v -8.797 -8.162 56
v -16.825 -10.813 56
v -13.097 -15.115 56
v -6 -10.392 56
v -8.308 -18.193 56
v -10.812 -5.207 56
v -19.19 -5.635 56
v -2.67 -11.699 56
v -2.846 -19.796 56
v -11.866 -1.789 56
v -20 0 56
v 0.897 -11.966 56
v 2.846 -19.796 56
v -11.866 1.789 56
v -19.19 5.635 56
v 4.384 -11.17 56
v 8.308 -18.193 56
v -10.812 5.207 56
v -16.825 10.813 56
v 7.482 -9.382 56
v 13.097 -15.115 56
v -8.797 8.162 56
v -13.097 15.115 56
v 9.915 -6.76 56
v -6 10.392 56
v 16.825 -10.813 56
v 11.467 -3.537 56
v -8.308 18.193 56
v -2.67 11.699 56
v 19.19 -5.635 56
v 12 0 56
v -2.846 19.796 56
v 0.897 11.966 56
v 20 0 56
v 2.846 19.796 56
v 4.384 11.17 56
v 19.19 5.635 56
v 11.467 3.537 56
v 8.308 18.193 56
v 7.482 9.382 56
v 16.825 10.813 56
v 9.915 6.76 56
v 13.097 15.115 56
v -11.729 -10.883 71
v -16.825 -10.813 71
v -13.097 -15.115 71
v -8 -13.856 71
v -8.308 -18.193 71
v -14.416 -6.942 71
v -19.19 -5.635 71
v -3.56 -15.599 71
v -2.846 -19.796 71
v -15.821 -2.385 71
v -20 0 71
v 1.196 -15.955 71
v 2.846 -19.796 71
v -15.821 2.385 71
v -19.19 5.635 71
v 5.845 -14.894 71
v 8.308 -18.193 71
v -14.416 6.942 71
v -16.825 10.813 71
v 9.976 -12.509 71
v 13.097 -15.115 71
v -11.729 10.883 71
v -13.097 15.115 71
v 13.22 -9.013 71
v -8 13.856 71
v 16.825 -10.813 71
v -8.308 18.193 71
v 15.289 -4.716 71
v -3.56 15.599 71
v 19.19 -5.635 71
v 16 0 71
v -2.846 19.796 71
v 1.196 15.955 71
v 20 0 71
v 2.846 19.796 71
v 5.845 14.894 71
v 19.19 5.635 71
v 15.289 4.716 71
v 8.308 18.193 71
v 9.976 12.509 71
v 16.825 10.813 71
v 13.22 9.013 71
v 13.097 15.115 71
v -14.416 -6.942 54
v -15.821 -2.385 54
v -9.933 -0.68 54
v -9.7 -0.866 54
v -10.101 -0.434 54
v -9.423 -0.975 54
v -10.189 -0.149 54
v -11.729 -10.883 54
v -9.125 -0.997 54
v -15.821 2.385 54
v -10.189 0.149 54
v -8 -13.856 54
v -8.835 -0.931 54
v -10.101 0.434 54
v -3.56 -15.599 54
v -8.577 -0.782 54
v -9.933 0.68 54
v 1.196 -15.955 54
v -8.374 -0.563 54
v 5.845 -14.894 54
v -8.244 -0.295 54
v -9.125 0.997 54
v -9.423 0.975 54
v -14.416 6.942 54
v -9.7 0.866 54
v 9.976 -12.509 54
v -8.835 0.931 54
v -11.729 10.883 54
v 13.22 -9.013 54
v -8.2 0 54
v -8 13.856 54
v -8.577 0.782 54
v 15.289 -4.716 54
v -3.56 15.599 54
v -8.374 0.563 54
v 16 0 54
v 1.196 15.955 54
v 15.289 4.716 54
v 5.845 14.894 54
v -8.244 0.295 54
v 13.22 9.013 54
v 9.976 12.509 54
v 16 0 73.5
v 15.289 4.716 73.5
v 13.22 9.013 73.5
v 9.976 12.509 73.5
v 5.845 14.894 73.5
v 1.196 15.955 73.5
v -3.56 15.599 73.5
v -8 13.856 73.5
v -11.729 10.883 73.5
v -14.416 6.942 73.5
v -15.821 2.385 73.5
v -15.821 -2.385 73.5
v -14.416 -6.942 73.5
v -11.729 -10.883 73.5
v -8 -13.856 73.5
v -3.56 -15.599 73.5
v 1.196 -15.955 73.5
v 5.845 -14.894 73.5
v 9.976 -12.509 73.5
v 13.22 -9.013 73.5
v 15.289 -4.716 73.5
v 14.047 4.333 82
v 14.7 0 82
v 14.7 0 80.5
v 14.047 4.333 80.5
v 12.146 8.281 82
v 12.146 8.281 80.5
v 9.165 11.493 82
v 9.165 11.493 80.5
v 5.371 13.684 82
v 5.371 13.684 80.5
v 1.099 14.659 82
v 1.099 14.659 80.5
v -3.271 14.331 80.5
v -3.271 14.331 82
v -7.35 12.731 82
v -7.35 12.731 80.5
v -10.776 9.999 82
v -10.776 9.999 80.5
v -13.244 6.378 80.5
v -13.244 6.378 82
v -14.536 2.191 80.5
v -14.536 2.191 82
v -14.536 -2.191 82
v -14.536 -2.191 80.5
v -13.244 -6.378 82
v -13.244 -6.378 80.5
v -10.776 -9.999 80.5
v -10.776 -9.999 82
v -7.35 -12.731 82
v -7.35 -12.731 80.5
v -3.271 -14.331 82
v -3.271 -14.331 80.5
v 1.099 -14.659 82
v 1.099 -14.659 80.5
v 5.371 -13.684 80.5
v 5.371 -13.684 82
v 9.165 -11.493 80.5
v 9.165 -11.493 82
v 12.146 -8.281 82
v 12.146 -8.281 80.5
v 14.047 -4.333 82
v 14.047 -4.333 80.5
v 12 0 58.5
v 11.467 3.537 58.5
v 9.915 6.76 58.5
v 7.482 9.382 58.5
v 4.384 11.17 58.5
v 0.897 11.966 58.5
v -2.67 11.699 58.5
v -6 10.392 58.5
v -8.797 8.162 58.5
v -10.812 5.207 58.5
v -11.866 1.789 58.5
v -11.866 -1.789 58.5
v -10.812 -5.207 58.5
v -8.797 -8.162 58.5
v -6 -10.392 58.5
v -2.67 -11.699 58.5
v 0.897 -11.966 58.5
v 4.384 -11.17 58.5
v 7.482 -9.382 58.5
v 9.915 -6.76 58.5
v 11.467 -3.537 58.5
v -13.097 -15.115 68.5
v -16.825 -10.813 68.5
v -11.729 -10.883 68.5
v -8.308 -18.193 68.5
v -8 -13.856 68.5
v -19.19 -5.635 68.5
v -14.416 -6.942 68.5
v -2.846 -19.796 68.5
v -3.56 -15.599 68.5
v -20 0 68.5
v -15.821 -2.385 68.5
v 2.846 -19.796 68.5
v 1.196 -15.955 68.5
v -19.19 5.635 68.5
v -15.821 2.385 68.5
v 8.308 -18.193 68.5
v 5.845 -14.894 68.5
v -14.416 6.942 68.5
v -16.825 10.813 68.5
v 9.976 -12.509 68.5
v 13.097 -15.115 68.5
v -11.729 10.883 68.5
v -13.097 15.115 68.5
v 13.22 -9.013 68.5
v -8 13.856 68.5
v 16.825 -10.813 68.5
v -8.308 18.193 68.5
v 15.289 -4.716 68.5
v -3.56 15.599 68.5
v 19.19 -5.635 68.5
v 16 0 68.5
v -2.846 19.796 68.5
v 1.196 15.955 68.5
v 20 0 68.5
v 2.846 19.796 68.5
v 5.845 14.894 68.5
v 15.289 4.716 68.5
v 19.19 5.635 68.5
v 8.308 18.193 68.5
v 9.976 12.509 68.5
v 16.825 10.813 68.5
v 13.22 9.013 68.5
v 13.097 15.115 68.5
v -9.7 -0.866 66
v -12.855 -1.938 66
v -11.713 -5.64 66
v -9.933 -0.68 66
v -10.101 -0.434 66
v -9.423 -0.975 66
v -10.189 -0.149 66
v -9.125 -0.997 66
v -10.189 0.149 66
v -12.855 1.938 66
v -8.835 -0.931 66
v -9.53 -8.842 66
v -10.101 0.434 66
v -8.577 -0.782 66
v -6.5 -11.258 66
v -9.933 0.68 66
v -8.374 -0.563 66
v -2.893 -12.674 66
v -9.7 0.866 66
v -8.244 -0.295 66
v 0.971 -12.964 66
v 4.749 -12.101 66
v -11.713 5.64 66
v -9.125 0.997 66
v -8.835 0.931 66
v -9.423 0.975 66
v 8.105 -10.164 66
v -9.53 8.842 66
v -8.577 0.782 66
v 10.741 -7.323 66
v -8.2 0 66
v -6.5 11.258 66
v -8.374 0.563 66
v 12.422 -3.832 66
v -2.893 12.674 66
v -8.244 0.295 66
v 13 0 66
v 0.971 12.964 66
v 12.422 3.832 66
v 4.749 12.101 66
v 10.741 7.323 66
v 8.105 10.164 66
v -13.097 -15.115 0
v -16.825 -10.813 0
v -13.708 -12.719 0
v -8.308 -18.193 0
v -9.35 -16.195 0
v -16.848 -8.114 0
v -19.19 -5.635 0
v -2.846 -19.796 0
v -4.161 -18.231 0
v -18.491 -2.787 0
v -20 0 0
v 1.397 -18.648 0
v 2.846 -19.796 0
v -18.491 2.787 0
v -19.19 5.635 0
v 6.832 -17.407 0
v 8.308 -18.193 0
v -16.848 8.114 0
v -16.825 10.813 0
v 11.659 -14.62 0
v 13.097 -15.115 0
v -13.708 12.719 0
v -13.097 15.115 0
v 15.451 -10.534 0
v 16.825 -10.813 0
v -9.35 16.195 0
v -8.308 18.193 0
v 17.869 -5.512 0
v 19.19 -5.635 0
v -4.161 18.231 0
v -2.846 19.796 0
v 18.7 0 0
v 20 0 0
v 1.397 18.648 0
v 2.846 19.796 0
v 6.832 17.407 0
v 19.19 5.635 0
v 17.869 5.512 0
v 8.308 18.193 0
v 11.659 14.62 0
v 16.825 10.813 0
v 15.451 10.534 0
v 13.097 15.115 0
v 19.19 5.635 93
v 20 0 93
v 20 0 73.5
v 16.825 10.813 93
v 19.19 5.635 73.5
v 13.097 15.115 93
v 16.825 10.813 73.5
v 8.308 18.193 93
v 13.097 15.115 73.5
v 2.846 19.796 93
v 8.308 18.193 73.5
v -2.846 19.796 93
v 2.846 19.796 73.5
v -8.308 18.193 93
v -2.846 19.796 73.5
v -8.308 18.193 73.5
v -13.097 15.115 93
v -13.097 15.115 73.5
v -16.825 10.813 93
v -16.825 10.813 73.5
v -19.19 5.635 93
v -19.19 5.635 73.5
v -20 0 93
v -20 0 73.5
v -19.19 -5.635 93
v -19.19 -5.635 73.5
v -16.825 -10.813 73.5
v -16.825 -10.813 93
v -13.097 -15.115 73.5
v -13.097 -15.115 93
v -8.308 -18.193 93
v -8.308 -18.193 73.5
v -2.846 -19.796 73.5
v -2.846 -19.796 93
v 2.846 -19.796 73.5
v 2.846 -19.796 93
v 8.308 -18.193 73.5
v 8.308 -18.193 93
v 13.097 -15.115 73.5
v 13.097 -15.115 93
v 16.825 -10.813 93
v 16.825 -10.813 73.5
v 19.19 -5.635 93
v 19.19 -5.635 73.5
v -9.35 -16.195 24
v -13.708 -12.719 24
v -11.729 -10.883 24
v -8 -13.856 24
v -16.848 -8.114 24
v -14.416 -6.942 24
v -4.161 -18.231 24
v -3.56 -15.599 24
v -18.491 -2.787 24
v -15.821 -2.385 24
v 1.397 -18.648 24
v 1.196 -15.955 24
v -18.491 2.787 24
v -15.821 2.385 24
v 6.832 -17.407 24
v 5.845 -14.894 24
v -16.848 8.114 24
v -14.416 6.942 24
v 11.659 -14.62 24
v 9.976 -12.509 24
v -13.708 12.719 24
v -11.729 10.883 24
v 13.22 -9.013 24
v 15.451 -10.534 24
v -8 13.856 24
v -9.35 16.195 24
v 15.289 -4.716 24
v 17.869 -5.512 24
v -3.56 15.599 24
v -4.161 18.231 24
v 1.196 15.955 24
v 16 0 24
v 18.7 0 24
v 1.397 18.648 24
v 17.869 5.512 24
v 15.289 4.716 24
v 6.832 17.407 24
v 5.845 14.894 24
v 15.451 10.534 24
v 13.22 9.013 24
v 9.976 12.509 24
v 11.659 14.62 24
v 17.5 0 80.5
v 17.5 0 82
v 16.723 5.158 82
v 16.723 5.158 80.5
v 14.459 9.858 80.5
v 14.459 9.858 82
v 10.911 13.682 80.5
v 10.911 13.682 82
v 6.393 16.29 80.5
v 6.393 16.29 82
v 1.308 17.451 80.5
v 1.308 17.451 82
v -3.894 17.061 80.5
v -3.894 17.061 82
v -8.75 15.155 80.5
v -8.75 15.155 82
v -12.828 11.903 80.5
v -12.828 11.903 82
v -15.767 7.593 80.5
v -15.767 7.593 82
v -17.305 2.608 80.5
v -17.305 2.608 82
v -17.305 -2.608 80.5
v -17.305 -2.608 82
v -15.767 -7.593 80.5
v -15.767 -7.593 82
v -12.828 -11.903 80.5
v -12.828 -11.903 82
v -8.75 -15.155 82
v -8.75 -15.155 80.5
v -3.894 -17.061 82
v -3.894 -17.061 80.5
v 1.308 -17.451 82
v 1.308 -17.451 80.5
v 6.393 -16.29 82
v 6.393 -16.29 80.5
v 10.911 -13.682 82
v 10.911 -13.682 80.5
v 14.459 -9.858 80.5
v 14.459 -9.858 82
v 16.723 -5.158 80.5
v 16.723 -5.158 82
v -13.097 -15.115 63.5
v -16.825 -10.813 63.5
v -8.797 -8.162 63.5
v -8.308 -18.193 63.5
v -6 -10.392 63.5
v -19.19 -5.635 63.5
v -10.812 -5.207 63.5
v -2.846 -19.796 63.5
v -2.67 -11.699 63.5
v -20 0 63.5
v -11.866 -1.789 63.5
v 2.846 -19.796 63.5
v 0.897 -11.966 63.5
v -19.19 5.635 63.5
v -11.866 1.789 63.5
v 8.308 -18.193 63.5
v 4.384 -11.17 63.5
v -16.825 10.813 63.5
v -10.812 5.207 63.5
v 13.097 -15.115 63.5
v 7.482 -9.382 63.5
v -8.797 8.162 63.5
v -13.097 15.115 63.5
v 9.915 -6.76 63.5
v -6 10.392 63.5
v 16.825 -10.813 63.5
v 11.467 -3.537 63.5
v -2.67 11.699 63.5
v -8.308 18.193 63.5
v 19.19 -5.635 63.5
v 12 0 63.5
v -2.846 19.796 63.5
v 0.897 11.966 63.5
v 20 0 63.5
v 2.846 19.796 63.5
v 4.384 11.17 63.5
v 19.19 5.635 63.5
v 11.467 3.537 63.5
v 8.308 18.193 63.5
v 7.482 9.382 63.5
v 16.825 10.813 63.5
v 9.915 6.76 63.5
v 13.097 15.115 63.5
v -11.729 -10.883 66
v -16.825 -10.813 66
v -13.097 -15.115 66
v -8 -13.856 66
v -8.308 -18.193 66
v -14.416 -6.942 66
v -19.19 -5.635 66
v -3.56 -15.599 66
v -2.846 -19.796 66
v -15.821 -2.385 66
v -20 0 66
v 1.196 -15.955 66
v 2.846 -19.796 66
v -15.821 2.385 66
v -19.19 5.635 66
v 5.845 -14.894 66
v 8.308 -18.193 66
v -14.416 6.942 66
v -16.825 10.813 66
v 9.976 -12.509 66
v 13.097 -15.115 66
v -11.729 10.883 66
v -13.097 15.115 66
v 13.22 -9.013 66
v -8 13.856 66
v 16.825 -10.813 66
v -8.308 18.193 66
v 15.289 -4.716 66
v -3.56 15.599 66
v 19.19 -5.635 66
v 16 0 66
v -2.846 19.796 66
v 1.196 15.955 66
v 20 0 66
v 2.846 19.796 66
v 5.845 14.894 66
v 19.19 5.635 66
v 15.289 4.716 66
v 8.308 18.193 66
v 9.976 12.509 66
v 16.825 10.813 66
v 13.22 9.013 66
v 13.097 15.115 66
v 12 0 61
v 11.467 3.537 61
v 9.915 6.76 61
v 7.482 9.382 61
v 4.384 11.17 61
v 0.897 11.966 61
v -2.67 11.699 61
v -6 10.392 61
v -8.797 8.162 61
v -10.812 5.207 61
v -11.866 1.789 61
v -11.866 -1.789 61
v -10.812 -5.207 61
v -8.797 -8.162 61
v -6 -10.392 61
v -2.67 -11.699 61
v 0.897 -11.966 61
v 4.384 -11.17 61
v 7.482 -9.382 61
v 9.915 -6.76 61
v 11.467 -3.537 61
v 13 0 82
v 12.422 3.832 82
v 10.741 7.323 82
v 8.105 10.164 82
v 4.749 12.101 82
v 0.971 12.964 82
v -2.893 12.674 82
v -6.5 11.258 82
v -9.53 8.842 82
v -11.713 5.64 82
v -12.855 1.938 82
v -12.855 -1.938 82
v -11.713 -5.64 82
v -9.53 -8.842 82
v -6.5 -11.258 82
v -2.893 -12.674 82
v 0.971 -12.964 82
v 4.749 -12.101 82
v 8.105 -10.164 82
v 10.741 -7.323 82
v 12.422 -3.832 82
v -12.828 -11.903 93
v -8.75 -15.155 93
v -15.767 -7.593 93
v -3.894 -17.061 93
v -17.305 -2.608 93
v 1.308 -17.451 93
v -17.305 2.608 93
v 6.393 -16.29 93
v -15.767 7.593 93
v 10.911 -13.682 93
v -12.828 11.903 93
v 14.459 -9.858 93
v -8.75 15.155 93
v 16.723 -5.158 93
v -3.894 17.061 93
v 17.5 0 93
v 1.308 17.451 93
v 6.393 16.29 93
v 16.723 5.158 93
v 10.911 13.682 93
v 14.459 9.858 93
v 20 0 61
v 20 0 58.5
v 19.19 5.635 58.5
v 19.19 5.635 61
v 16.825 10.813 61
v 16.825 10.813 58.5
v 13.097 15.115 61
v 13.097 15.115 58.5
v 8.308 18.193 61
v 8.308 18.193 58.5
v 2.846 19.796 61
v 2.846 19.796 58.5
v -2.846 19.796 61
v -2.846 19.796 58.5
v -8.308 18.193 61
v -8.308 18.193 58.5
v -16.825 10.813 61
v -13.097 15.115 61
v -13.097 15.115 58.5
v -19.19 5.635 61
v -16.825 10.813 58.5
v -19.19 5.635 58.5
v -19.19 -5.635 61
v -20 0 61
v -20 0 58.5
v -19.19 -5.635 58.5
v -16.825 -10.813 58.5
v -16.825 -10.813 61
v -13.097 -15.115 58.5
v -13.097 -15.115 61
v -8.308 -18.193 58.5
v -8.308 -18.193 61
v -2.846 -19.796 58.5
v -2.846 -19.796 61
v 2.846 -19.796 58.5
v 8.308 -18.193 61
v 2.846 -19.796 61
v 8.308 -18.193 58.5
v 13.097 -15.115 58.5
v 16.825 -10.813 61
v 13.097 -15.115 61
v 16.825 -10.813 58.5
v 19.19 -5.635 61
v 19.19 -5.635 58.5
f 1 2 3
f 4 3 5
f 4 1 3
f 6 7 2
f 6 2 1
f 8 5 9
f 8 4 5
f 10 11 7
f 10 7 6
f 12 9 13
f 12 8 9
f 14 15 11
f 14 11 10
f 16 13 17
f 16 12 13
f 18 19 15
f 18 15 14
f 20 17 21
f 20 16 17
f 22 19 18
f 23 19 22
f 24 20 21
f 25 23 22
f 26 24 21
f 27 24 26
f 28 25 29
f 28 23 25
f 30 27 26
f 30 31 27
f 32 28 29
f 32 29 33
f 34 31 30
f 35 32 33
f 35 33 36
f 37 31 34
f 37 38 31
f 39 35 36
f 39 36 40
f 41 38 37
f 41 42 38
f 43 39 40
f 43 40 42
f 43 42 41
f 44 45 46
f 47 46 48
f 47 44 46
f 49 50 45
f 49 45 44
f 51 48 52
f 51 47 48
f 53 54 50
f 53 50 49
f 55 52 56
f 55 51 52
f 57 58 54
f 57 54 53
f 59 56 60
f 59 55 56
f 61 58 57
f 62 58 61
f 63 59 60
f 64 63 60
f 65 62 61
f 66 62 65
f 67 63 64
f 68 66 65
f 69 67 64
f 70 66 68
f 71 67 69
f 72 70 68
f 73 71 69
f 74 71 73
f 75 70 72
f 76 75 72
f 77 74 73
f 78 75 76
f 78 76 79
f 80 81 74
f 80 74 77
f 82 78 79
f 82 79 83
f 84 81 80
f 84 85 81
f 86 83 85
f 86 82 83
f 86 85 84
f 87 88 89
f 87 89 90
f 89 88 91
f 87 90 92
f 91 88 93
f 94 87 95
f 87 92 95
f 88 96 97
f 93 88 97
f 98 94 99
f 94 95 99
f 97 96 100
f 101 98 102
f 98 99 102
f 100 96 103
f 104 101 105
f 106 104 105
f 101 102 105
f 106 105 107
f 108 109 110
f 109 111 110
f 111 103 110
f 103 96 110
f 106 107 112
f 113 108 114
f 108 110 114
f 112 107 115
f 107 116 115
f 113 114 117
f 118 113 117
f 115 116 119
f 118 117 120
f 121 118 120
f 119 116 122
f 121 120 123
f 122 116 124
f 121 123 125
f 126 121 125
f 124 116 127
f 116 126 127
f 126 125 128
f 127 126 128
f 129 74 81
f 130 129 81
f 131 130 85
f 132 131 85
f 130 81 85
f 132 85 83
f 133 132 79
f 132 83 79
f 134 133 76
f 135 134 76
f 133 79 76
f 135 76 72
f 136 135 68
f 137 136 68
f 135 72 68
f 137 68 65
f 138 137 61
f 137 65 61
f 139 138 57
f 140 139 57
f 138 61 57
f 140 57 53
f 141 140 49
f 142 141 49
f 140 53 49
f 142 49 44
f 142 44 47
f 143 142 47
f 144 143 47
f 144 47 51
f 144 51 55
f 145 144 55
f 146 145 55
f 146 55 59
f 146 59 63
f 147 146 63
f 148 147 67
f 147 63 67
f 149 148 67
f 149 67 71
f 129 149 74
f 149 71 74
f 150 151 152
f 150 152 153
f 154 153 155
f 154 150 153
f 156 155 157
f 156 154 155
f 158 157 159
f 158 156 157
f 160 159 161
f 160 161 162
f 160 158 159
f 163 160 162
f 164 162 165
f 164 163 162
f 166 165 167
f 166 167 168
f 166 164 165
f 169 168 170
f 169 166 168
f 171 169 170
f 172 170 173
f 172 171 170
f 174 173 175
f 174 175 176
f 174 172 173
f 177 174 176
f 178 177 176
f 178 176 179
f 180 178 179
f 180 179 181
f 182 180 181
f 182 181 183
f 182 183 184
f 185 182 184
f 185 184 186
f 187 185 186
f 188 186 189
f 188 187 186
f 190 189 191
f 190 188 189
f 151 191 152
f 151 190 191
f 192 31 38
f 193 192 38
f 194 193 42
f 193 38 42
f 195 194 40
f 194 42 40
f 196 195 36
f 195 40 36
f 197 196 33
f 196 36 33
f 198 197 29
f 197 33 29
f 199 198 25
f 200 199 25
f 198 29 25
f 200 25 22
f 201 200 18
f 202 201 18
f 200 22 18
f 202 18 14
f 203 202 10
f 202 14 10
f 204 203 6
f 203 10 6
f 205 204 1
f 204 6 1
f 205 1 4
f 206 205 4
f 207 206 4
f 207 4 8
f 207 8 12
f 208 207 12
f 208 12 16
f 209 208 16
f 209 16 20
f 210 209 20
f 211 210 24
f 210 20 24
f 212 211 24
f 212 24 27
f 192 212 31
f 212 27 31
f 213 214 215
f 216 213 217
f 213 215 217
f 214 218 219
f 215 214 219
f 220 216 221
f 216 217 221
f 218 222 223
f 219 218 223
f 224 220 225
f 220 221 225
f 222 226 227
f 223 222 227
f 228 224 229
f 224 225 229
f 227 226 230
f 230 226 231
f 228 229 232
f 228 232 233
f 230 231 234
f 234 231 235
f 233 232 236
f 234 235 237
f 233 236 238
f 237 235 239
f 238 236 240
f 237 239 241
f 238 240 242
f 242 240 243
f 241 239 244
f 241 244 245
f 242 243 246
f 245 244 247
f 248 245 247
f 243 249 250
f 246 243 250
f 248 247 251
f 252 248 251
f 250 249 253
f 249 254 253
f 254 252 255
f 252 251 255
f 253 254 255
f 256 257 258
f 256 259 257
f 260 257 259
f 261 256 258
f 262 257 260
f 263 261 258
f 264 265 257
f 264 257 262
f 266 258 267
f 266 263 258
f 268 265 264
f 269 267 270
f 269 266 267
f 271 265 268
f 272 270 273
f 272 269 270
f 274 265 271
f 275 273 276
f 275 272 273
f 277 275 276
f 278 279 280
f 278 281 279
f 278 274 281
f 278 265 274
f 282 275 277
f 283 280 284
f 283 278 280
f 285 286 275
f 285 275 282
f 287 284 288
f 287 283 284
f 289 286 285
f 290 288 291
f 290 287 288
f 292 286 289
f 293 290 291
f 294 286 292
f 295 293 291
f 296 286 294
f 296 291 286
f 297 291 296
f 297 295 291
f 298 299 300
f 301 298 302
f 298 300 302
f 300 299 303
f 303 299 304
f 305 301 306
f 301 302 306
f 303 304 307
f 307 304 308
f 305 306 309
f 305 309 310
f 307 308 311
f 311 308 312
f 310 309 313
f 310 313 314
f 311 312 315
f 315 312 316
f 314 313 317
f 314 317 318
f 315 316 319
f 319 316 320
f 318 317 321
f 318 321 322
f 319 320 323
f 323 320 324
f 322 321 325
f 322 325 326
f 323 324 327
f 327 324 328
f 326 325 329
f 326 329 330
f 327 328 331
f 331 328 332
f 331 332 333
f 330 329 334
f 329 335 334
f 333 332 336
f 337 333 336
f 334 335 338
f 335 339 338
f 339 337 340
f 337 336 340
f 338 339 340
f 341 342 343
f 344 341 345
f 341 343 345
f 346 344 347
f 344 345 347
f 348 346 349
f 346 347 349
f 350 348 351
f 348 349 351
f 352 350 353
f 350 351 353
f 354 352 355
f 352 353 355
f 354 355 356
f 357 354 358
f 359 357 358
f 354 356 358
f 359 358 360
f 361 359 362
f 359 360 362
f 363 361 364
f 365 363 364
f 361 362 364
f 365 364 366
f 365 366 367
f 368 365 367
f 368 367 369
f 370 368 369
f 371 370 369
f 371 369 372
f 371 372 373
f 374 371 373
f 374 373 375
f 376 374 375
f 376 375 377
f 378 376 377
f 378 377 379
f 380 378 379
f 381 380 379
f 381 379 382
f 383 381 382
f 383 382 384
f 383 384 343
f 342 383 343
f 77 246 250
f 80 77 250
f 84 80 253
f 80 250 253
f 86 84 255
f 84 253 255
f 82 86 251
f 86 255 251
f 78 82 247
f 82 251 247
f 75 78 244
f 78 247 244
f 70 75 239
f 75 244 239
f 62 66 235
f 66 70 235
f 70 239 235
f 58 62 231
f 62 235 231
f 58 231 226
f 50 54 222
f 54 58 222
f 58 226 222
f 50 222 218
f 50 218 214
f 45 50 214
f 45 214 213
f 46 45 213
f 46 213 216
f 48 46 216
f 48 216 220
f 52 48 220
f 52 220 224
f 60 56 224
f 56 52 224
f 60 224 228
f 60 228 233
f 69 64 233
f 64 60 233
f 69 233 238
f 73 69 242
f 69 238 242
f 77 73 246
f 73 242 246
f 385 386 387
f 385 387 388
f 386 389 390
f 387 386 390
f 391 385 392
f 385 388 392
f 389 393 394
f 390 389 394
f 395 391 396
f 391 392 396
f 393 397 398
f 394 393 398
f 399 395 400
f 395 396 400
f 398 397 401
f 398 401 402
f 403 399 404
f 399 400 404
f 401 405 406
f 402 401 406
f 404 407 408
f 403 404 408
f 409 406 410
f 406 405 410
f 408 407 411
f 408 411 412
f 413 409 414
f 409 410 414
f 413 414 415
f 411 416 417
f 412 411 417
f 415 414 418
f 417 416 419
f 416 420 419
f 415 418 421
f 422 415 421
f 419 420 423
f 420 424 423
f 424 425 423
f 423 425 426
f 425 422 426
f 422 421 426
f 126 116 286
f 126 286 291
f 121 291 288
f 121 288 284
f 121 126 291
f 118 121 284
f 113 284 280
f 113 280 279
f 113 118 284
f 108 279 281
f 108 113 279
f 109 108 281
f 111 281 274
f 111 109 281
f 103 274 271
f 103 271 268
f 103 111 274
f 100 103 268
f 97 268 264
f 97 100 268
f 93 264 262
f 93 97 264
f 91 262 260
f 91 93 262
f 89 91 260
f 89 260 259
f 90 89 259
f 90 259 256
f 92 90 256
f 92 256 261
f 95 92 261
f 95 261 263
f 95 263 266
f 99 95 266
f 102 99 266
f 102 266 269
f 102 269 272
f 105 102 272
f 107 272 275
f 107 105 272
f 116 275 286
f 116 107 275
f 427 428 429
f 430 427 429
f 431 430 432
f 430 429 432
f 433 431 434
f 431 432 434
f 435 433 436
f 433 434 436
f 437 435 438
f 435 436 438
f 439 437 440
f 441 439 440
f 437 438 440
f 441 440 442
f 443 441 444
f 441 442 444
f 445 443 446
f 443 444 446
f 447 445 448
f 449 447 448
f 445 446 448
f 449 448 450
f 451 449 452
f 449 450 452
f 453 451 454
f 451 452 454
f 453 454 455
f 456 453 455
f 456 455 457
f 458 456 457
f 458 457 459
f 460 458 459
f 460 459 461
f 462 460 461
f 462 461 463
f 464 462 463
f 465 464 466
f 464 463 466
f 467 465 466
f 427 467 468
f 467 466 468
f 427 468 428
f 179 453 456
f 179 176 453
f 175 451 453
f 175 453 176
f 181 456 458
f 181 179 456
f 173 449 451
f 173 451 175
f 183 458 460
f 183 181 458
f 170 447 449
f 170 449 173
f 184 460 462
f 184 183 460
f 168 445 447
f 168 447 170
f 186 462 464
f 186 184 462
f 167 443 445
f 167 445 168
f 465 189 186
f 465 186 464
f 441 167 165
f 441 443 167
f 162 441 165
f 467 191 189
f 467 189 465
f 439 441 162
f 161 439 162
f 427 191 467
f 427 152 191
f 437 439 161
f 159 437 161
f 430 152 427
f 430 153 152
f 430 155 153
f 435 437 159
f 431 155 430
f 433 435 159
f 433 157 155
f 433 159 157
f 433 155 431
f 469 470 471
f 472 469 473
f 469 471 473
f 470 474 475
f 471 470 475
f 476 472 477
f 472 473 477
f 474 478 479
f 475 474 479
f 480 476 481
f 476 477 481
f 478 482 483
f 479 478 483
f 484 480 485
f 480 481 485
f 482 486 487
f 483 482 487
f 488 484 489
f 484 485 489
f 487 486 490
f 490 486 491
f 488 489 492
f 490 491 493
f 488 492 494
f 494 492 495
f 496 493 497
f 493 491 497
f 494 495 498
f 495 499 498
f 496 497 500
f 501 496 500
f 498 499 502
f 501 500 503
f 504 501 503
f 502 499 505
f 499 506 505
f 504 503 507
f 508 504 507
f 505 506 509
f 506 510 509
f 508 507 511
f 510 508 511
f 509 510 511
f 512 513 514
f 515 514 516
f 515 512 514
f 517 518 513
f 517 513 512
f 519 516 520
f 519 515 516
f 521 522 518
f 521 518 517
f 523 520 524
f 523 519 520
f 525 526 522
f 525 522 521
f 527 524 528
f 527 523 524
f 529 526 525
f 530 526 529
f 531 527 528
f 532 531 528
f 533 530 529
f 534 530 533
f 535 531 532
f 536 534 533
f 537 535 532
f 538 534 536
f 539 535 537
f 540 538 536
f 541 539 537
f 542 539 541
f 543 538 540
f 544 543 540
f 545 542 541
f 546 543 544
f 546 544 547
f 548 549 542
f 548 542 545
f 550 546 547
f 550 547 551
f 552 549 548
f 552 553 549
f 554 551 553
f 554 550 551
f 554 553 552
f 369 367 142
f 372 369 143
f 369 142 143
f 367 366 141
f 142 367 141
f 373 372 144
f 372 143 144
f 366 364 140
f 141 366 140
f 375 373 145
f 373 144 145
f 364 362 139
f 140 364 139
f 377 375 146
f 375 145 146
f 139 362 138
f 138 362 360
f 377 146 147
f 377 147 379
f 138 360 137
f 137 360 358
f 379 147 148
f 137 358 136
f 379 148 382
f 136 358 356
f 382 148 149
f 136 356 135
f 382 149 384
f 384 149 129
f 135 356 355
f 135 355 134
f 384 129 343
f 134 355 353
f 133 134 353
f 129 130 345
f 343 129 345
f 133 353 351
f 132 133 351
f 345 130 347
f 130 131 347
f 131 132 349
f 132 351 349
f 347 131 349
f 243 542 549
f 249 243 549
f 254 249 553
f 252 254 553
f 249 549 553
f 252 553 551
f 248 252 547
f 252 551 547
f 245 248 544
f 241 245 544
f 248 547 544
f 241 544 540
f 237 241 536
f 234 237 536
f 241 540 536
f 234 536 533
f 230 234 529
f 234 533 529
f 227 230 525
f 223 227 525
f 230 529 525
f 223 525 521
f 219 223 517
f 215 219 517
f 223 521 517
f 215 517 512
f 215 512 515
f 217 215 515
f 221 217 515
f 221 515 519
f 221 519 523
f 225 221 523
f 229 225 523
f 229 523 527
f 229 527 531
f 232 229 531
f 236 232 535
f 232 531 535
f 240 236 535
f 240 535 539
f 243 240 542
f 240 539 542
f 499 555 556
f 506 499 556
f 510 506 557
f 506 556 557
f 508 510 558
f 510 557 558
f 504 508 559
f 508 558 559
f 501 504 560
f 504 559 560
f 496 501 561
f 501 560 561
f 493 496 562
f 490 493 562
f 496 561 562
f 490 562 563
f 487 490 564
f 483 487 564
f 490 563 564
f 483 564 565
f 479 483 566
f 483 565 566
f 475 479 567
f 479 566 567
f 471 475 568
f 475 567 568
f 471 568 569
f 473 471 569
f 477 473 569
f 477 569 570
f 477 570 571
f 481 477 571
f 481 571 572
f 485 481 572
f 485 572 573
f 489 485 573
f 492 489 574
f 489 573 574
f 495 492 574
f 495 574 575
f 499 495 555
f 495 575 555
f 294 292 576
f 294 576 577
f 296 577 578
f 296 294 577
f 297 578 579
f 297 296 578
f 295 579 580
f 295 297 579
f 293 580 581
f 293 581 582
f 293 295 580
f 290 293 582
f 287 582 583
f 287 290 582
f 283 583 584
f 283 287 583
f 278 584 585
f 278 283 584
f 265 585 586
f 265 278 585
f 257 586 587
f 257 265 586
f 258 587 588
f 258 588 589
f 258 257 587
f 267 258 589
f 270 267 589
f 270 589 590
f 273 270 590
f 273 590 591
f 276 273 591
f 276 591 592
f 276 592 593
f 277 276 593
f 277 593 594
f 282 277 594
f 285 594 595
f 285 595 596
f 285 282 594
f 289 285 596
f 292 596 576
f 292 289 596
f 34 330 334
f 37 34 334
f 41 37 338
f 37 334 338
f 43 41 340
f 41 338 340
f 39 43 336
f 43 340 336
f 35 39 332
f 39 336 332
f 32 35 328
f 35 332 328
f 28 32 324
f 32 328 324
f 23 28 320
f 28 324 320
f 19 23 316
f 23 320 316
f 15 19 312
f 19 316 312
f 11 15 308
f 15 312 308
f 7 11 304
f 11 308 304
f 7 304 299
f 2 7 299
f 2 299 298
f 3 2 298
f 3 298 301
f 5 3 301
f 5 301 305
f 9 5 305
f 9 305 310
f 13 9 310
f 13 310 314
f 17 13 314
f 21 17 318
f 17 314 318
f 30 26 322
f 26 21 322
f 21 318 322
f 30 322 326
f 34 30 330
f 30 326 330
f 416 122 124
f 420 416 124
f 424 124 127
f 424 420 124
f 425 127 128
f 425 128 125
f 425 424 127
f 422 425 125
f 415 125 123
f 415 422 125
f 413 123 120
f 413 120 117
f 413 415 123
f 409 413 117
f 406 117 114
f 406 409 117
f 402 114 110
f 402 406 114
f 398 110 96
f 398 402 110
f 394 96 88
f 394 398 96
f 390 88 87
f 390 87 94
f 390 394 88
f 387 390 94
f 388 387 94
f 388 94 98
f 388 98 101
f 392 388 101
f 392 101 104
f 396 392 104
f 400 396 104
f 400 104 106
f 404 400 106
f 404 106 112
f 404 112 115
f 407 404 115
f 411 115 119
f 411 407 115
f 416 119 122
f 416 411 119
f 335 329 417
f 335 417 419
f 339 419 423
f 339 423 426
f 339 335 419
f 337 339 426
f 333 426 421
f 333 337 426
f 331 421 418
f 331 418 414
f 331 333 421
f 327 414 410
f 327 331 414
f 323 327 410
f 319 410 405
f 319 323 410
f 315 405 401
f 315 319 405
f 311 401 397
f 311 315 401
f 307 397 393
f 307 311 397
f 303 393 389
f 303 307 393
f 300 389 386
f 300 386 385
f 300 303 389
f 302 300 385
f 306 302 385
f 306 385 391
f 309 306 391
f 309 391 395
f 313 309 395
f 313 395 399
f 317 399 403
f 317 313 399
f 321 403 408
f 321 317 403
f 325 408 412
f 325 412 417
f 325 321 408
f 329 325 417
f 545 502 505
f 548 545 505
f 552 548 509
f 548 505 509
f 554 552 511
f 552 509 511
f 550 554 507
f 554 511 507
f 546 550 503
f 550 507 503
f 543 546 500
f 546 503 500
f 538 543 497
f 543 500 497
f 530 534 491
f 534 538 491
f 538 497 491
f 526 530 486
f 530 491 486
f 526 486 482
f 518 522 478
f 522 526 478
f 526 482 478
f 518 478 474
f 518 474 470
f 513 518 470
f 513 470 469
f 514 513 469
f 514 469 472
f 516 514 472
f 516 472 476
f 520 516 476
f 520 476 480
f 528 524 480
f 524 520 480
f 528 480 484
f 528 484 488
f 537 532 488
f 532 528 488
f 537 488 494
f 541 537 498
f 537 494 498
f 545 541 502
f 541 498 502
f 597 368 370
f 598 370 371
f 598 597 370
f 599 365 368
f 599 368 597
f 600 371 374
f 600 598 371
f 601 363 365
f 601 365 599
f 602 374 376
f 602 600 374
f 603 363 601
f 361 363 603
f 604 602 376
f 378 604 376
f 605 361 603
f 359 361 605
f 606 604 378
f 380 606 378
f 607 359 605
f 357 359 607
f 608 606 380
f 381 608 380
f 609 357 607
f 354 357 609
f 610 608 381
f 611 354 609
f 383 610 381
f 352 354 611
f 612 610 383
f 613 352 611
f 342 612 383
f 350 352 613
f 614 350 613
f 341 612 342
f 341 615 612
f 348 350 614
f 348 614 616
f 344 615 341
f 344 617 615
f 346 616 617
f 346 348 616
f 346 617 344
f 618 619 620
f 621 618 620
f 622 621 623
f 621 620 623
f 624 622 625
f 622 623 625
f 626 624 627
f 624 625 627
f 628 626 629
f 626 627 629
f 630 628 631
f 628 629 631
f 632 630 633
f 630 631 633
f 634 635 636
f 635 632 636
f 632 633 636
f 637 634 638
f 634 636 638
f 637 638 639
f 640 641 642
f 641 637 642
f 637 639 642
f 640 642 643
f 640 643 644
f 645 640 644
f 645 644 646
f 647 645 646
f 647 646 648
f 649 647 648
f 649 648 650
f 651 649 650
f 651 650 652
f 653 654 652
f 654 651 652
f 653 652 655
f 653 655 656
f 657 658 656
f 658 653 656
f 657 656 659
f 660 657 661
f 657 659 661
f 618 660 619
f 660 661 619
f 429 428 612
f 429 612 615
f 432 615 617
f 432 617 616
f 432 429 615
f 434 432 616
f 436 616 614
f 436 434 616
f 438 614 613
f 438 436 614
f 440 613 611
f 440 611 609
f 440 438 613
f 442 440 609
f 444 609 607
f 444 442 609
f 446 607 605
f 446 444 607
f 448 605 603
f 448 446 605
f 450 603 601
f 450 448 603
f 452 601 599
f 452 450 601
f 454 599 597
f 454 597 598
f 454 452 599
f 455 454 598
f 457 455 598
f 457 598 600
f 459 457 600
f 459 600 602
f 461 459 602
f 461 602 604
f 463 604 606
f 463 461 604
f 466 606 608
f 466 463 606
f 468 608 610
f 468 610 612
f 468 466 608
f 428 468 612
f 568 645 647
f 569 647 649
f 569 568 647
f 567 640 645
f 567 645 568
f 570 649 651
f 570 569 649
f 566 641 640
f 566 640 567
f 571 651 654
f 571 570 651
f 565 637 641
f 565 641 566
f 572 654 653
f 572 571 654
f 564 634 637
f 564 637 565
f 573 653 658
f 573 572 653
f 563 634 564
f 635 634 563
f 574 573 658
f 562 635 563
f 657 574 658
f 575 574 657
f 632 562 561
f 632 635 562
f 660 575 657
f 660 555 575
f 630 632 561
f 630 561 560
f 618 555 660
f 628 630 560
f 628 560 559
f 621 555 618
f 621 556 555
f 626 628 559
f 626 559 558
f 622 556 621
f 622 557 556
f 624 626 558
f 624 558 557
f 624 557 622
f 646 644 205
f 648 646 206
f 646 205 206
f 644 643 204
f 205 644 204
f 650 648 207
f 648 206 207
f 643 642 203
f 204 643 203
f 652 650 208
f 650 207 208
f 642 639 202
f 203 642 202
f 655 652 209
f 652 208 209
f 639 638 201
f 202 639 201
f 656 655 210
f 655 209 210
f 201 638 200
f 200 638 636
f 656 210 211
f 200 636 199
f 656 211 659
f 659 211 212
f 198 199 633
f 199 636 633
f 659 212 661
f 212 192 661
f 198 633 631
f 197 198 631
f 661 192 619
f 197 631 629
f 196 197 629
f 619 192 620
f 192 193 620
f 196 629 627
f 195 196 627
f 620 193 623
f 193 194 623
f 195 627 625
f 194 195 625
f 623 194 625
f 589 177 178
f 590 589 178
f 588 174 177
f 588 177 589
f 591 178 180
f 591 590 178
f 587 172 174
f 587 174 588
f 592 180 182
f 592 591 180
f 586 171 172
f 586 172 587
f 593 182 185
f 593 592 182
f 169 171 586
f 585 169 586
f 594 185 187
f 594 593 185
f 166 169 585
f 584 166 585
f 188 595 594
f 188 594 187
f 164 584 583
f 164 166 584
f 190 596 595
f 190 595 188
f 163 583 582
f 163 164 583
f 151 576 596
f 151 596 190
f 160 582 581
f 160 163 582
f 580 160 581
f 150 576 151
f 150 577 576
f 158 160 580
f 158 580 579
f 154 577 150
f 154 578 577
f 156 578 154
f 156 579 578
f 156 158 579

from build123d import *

# Parameters (mm, degrees)
SKETCH_R       = 18.7
PAD_DEPTH      = 24
SKETCH001_R    = 16
PAD001_DEPTH   = 30
SKETCH002_R    = 1
PAD002_DEPTH   = 12
SKETCH003_R    = 13
PAD003_DEPTH   = 16
SKETCH004_R    = 17.5
PAD004_DEPTH   = 11
SKETCH008_R    = 22
SKETCH008_R_2  = 12
PAD008_DEPTH   = 2.5
SKETCH007_R    = 22
SKETCH007_R_2  = 12
PAD007_DEPTH   = 2.5
SKETCH006_R    = 22
SKETCH006_R_2  = 16
PAD006_DEPTH   = 2.5
SKETCH005_R    = 22
SKETCH005_R_2  = 16
PAD005_DEPTH   = 2.5
CYLINDER_R     = 20
CYLINDER_DEPTH = 93
SKETCH012_R    = 17.5
SKETCH012_R_2  = 14.7
POCKET_DEPTH   = 1.5


with BuildPart() as raum_glas:
    # Sketch → Pad (new body)
    with BuildSketch(Plane.XY):
        Circle(SKETCH_R)
    extrude(amount=PAD_DEPTH)

    # Sketch001 → Pad001 (new body)
    with BuildSketch(Plane.XY.offset(24)):
        Circle(SKETCH001_R)
    extrude(amount=PAD001_DEPTH)

    # Sketch002 → Pad002 (new body)
    with BuildSketch(Plane.XY.offset(54)):
        with Locations((-9.2, 0)):
            Circle(SKETCH002_R)
    extrude(amount=PAD002_DEPTH)

    # Sketch003 → Pad003 (new body)
    with BuildSketch(Plane.XY.offset(66)):
        Circle(SKETCH003_R)
    extrude(amount=PAD003_DEPTH)

    # Sketch004 → Pad004 (new body)
    with BuildSketch(Plane.XY.offset(82)):
        Circle(SKETCH004_R)
    extrude(amount=PAD004_DEPTH)


with BuildPart() as pad008:
    # Sketch008 → Pad008 (new body)
    with BuildSketch(Plane.XY.offset(56)):
        Circle(SKETCH008_R)
        Circle(SKETCH008_R_2, mode=Mode.SUBTRACT)
    extrude(amount=PAD008_DEPTH)


with BuildPart() as pad007:
    # Sketch007 → Pad007 (new body)
    with BuildSketch(Plane.XY.offset(61)):
        Circle(SKETCH007_R)
        Circle(SKETCH007_R_2, mode=Mode.SUBTRACT)
    extrude(amount=PAD007_DEPTH)


with BuildPart() as pad006:
    # Sketch006 → Pad006 (new body)
    with BuildSketch(Plane.XY.offset(71)):
        Circle(SKETCH006_R)
        Circle(SKETCH006_R_2, mode=Mode.SUBTRACT)
    extrude(amount=PAD006_DEPTH)


with BuildPart() as pad005:
    # Sketch005 → Pad005 (new body)
    with BuildSketch(Plane.XY.offset(66)):
        Circle(SKETCH005_R)
        Circle(SKETCH005_R_2, mode=Mode.SUBTRACT)
    extrude(amount=PAD005_DEPTH)


with BuildPart() as nut_axial:
    # Cylinder → Cylinder (new body)
    with BuildSketch(Plane.XY):
        Circle(CYLINDER_R)
    extrude(amount=CYLINDER_DEPTH)

    # Cut: cut Pad005
    add(pad005.part, mode=Mode.SUBTRACT)

    # Cut001: cut Pad006
    add(pad006.part, mode=Mode.SUBTRACT)

    # Cut002: cut Pad007
    add(pad007.part, mode=Mode.SUBTRACT)

    # Cut003: cut Pad008
    add(pad008.part, mode=Mode.SUBTRACT)

    # Cut010: cut Raum Glas
    add(raum_glas.part, mode=Mode.SUBTRACT)

    # Sketch012 → Pocket (cut)
    with BuildSketch(Plane.XY.offset(82)):
        Circle(SKETCH012_R)
        Circle(SKETCH012_R_2, mode=Mode.SUBTRACT)
    extrude(amount=-POCKET_DEPTH, mode=Mode.SUBTRACT)


solid = nut_axial.part
